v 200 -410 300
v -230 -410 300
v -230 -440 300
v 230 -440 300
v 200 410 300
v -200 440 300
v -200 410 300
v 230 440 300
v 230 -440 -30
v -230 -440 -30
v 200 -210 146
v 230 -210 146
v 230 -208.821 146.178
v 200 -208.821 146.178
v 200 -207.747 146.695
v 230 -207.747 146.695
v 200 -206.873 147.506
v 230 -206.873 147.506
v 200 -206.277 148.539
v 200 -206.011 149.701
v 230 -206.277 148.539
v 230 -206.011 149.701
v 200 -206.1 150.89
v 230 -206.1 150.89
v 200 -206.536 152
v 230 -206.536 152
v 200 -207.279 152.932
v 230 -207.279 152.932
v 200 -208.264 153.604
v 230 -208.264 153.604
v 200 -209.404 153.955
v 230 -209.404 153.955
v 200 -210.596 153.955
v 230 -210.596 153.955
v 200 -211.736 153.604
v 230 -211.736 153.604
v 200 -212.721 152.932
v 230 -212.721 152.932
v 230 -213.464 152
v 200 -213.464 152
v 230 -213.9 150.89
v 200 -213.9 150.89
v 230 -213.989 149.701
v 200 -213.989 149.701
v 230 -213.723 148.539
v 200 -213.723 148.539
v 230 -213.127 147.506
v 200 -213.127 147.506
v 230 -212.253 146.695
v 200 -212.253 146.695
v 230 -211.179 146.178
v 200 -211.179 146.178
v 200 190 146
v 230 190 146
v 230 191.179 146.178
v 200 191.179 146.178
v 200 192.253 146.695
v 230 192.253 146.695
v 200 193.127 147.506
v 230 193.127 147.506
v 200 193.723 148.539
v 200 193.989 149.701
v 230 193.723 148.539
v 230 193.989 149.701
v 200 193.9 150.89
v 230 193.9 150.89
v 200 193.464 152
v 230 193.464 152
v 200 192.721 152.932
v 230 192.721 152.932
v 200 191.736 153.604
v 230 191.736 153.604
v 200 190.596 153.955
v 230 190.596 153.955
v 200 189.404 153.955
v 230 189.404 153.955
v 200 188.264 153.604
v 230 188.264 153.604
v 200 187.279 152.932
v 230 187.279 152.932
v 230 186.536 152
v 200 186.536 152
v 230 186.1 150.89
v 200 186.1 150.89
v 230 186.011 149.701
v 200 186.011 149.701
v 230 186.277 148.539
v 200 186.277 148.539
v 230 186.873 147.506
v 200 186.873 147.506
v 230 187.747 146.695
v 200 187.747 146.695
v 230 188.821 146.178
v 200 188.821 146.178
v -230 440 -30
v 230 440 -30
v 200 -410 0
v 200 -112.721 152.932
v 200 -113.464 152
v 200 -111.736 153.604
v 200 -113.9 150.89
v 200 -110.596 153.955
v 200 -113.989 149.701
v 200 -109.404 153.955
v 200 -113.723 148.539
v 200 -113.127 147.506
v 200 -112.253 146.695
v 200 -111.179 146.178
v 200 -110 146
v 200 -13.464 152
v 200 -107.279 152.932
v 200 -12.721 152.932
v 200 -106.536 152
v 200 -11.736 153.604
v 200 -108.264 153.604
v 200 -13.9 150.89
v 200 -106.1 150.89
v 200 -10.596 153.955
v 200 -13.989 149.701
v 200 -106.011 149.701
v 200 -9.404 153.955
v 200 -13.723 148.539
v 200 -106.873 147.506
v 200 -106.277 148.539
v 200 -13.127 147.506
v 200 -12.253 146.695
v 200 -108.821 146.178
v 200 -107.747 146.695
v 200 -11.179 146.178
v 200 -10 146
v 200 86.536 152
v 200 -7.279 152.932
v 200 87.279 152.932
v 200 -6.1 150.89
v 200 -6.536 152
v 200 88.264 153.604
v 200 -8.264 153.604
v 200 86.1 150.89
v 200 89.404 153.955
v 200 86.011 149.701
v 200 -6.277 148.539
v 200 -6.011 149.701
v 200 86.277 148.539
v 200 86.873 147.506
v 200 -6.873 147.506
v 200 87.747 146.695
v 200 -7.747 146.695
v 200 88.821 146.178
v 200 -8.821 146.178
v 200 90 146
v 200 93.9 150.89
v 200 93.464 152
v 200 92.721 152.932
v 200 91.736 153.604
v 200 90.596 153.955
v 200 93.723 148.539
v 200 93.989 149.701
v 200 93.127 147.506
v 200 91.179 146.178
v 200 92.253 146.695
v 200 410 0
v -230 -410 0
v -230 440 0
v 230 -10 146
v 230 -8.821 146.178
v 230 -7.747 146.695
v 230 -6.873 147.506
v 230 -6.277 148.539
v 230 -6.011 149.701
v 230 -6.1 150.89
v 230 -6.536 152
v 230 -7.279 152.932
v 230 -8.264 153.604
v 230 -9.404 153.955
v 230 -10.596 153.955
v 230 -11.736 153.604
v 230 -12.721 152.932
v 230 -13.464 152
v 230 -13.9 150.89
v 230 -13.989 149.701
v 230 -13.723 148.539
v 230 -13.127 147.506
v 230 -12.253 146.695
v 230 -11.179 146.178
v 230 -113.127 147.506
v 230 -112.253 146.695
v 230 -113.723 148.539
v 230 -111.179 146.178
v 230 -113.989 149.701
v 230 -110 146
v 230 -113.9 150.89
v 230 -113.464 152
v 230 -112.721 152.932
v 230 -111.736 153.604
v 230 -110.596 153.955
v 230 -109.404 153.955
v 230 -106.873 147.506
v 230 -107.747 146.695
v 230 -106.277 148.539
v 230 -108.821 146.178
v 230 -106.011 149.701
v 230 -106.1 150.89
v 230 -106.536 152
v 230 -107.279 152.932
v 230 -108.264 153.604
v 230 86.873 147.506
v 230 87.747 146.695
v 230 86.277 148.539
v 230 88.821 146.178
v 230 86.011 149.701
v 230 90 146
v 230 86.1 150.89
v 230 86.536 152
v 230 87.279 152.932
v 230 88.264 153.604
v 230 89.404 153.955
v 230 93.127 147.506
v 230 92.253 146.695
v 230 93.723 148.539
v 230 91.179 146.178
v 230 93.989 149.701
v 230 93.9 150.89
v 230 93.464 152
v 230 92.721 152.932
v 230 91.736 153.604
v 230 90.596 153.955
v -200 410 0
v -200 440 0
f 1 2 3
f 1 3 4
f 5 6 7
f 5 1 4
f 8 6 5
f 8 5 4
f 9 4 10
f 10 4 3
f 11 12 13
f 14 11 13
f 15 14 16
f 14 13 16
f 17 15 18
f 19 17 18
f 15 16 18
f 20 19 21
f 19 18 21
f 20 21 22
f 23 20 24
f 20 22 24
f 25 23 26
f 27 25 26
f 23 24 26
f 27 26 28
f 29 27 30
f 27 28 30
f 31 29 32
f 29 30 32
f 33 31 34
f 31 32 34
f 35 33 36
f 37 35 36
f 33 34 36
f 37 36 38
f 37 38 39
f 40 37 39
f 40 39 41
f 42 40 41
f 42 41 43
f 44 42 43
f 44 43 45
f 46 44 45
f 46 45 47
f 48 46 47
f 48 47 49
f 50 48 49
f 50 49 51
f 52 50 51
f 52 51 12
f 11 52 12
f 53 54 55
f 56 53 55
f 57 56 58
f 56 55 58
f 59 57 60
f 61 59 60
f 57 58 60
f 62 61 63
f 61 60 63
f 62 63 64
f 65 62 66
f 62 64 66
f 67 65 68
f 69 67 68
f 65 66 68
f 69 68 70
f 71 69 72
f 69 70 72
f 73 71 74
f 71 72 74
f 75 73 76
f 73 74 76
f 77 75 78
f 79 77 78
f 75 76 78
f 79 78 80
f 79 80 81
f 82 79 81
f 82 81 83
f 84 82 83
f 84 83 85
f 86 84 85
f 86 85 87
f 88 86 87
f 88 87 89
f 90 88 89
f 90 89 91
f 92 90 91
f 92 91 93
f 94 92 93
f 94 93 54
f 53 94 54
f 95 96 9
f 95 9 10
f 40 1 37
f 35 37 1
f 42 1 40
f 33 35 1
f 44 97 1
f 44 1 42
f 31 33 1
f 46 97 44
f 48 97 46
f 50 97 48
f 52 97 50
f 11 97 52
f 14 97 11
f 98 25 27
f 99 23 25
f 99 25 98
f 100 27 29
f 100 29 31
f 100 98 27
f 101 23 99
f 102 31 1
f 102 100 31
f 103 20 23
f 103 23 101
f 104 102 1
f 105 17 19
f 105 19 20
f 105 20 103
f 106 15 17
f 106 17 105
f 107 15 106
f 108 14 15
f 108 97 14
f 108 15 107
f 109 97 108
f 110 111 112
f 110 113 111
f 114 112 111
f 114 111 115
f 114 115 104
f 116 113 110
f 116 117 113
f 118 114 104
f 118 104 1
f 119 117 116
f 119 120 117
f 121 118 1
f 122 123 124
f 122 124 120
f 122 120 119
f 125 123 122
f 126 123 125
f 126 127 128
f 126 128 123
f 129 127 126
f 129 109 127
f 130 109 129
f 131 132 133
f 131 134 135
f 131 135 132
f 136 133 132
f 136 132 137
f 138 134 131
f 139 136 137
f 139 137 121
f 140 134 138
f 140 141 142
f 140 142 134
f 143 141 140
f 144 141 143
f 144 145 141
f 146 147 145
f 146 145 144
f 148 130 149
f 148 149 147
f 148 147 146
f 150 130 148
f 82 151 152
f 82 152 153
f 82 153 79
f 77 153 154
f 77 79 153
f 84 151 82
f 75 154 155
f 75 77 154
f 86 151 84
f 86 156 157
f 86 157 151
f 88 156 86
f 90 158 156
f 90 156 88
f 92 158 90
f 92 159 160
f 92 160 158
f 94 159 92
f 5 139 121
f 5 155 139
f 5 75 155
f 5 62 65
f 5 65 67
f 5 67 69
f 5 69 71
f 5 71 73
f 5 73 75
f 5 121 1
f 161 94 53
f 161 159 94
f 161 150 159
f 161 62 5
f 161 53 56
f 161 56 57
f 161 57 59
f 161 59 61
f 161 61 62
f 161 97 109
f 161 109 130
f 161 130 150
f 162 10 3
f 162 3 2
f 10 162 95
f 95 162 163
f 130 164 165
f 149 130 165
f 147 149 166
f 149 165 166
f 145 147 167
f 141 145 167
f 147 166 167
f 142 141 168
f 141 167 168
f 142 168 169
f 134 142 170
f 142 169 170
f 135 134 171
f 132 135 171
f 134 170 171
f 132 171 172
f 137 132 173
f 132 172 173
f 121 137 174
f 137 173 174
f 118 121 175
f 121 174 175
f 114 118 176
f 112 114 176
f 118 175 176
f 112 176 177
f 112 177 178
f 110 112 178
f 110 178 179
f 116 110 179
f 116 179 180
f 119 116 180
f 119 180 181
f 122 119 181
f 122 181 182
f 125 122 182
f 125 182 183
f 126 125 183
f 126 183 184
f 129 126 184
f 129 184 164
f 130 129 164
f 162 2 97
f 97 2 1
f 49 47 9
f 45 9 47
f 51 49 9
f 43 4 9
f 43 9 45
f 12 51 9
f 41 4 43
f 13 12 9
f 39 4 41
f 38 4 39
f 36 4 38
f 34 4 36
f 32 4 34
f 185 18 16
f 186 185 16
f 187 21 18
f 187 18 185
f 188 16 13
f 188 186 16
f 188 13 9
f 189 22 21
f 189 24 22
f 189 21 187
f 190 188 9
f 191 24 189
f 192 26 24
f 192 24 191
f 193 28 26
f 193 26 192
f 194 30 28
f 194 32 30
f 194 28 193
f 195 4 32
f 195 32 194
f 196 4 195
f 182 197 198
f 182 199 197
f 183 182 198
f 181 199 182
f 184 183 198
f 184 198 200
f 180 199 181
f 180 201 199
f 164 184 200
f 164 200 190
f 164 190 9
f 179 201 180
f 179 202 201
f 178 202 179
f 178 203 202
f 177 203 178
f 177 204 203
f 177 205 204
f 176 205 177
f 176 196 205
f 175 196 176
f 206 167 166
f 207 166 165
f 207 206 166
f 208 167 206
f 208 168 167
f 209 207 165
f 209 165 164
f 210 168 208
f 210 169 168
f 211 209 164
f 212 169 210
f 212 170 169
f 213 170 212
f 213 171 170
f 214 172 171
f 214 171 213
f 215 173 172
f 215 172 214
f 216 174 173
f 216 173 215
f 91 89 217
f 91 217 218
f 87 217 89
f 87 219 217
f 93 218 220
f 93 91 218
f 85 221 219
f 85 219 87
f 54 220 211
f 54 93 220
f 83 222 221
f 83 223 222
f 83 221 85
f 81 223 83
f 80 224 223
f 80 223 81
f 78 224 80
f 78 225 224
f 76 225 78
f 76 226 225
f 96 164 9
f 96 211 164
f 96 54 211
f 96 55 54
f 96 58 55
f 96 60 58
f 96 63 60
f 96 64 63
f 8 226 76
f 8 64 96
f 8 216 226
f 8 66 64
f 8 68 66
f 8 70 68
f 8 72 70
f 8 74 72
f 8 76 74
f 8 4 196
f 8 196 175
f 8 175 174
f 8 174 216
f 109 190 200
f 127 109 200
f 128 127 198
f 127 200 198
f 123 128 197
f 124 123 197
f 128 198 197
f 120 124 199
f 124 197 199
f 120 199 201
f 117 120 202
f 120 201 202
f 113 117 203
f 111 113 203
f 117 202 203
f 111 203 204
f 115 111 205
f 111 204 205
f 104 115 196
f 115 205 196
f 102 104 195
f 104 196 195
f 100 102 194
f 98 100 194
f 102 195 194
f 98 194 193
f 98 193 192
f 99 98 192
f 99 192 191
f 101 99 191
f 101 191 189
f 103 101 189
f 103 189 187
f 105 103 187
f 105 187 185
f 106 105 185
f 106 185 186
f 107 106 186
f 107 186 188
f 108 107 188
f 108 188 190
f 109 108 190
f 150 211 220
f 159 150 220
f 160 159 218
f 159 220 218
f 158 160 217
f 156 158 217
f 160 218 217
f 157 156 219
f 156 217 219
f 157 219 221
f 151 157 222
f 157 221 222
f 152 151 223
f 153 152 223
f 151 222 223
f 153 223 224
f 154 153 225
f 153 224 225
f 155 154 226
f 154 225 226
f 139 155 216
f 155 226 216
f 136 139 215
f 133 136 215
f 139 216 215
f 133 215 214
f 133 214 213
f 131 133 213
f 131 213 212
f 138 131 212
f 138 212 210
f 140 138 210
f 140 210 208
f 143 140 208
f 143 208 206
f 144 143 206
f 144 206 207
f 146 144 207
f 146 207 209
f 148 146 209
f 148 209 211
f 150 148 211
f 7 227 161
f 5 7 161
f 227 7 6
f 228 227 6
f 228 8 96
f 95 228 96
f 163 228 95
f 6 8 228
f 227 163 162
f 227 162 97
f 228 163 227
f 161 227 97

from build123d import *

# Parameters (mm, degrees)
SKETCH1_W           = 460
SKETCH1_H           = 880
SKETCH1_W_2         = 400
SKETCH1_H_2         = 820
BOSS_EXTRUDE1_DEPTH = 300
SKETCH2_W           = 460
SKETCH2_H           = 880
BOSS_EXTRUDE2_DEPTH = 30
SKETCH3_R           = 4
CUT_EXTRUDE1_DEPTH  = 460
SKETCH4_W           = 30
SKETCH4_H           = 850
CUT_EXTRUDE2_DEPTH  = 300


with BuildPart() as part:
    # Sketch1 → Boss-Extrude1 (new body)
    with BuildSketch(Plane.XY):
        Rectangle(SKETCH1_W, SKETCH1_H)
        Rectangle(SKETCH1_W_2, SKETCH1_H_2, mode=Mode.SUBTRACT)
    extrude(amount=BOSS_EXTRUDE1_DEPTH)

    # Sketch2 → Boss-Extrude2 (add)
    with BuildSketch(Plane(origin=(0, 0, 0), x_dir=(-1, 0, 0), z_dir=(0, 0, -1))):
        Rectangle(SKETCH2_W, SKETCH2_H)
    extrude(amount=BOSS_EXTRUDE2_DEPTH)

    # Sketch3 → Cut-Extrude1 (cut)
    with BuildSketch(Plane(origin=(230, 0, 0), x_dir=(0, 0, -1), z_dir=(1, 0, 0))):
        with Locations((-150, 190)):
            Circle(SKETCH3_R)
        with Locations((-150, 90)):
            Circle(SKETCH3_R)
        with Locations((-150, -10)):
            Circle(SKETCH3_R)
        with Locations((-150, -110)):
            Circle(SKETCH3_R)
        with Locations((-150, -210)):
            Circle(SKETCH3_R)
    extrude(amount=-CUT_EXTRUDE1_DEPTH, mode=Mode.SUBTRACT)

    # Sketch4 → Cut-Extrude2 (cut)
    with BuildSketch(Plane.XY.offset(300)):
        with Locations((-215, 15)):
            Rectangle(SKETCH4_W, SKETCH4_H)
    extrude(amount=-CUT_EXTRUDE2_DEPTH, mode=Mode.SUBTRACT)


solid = part.part
